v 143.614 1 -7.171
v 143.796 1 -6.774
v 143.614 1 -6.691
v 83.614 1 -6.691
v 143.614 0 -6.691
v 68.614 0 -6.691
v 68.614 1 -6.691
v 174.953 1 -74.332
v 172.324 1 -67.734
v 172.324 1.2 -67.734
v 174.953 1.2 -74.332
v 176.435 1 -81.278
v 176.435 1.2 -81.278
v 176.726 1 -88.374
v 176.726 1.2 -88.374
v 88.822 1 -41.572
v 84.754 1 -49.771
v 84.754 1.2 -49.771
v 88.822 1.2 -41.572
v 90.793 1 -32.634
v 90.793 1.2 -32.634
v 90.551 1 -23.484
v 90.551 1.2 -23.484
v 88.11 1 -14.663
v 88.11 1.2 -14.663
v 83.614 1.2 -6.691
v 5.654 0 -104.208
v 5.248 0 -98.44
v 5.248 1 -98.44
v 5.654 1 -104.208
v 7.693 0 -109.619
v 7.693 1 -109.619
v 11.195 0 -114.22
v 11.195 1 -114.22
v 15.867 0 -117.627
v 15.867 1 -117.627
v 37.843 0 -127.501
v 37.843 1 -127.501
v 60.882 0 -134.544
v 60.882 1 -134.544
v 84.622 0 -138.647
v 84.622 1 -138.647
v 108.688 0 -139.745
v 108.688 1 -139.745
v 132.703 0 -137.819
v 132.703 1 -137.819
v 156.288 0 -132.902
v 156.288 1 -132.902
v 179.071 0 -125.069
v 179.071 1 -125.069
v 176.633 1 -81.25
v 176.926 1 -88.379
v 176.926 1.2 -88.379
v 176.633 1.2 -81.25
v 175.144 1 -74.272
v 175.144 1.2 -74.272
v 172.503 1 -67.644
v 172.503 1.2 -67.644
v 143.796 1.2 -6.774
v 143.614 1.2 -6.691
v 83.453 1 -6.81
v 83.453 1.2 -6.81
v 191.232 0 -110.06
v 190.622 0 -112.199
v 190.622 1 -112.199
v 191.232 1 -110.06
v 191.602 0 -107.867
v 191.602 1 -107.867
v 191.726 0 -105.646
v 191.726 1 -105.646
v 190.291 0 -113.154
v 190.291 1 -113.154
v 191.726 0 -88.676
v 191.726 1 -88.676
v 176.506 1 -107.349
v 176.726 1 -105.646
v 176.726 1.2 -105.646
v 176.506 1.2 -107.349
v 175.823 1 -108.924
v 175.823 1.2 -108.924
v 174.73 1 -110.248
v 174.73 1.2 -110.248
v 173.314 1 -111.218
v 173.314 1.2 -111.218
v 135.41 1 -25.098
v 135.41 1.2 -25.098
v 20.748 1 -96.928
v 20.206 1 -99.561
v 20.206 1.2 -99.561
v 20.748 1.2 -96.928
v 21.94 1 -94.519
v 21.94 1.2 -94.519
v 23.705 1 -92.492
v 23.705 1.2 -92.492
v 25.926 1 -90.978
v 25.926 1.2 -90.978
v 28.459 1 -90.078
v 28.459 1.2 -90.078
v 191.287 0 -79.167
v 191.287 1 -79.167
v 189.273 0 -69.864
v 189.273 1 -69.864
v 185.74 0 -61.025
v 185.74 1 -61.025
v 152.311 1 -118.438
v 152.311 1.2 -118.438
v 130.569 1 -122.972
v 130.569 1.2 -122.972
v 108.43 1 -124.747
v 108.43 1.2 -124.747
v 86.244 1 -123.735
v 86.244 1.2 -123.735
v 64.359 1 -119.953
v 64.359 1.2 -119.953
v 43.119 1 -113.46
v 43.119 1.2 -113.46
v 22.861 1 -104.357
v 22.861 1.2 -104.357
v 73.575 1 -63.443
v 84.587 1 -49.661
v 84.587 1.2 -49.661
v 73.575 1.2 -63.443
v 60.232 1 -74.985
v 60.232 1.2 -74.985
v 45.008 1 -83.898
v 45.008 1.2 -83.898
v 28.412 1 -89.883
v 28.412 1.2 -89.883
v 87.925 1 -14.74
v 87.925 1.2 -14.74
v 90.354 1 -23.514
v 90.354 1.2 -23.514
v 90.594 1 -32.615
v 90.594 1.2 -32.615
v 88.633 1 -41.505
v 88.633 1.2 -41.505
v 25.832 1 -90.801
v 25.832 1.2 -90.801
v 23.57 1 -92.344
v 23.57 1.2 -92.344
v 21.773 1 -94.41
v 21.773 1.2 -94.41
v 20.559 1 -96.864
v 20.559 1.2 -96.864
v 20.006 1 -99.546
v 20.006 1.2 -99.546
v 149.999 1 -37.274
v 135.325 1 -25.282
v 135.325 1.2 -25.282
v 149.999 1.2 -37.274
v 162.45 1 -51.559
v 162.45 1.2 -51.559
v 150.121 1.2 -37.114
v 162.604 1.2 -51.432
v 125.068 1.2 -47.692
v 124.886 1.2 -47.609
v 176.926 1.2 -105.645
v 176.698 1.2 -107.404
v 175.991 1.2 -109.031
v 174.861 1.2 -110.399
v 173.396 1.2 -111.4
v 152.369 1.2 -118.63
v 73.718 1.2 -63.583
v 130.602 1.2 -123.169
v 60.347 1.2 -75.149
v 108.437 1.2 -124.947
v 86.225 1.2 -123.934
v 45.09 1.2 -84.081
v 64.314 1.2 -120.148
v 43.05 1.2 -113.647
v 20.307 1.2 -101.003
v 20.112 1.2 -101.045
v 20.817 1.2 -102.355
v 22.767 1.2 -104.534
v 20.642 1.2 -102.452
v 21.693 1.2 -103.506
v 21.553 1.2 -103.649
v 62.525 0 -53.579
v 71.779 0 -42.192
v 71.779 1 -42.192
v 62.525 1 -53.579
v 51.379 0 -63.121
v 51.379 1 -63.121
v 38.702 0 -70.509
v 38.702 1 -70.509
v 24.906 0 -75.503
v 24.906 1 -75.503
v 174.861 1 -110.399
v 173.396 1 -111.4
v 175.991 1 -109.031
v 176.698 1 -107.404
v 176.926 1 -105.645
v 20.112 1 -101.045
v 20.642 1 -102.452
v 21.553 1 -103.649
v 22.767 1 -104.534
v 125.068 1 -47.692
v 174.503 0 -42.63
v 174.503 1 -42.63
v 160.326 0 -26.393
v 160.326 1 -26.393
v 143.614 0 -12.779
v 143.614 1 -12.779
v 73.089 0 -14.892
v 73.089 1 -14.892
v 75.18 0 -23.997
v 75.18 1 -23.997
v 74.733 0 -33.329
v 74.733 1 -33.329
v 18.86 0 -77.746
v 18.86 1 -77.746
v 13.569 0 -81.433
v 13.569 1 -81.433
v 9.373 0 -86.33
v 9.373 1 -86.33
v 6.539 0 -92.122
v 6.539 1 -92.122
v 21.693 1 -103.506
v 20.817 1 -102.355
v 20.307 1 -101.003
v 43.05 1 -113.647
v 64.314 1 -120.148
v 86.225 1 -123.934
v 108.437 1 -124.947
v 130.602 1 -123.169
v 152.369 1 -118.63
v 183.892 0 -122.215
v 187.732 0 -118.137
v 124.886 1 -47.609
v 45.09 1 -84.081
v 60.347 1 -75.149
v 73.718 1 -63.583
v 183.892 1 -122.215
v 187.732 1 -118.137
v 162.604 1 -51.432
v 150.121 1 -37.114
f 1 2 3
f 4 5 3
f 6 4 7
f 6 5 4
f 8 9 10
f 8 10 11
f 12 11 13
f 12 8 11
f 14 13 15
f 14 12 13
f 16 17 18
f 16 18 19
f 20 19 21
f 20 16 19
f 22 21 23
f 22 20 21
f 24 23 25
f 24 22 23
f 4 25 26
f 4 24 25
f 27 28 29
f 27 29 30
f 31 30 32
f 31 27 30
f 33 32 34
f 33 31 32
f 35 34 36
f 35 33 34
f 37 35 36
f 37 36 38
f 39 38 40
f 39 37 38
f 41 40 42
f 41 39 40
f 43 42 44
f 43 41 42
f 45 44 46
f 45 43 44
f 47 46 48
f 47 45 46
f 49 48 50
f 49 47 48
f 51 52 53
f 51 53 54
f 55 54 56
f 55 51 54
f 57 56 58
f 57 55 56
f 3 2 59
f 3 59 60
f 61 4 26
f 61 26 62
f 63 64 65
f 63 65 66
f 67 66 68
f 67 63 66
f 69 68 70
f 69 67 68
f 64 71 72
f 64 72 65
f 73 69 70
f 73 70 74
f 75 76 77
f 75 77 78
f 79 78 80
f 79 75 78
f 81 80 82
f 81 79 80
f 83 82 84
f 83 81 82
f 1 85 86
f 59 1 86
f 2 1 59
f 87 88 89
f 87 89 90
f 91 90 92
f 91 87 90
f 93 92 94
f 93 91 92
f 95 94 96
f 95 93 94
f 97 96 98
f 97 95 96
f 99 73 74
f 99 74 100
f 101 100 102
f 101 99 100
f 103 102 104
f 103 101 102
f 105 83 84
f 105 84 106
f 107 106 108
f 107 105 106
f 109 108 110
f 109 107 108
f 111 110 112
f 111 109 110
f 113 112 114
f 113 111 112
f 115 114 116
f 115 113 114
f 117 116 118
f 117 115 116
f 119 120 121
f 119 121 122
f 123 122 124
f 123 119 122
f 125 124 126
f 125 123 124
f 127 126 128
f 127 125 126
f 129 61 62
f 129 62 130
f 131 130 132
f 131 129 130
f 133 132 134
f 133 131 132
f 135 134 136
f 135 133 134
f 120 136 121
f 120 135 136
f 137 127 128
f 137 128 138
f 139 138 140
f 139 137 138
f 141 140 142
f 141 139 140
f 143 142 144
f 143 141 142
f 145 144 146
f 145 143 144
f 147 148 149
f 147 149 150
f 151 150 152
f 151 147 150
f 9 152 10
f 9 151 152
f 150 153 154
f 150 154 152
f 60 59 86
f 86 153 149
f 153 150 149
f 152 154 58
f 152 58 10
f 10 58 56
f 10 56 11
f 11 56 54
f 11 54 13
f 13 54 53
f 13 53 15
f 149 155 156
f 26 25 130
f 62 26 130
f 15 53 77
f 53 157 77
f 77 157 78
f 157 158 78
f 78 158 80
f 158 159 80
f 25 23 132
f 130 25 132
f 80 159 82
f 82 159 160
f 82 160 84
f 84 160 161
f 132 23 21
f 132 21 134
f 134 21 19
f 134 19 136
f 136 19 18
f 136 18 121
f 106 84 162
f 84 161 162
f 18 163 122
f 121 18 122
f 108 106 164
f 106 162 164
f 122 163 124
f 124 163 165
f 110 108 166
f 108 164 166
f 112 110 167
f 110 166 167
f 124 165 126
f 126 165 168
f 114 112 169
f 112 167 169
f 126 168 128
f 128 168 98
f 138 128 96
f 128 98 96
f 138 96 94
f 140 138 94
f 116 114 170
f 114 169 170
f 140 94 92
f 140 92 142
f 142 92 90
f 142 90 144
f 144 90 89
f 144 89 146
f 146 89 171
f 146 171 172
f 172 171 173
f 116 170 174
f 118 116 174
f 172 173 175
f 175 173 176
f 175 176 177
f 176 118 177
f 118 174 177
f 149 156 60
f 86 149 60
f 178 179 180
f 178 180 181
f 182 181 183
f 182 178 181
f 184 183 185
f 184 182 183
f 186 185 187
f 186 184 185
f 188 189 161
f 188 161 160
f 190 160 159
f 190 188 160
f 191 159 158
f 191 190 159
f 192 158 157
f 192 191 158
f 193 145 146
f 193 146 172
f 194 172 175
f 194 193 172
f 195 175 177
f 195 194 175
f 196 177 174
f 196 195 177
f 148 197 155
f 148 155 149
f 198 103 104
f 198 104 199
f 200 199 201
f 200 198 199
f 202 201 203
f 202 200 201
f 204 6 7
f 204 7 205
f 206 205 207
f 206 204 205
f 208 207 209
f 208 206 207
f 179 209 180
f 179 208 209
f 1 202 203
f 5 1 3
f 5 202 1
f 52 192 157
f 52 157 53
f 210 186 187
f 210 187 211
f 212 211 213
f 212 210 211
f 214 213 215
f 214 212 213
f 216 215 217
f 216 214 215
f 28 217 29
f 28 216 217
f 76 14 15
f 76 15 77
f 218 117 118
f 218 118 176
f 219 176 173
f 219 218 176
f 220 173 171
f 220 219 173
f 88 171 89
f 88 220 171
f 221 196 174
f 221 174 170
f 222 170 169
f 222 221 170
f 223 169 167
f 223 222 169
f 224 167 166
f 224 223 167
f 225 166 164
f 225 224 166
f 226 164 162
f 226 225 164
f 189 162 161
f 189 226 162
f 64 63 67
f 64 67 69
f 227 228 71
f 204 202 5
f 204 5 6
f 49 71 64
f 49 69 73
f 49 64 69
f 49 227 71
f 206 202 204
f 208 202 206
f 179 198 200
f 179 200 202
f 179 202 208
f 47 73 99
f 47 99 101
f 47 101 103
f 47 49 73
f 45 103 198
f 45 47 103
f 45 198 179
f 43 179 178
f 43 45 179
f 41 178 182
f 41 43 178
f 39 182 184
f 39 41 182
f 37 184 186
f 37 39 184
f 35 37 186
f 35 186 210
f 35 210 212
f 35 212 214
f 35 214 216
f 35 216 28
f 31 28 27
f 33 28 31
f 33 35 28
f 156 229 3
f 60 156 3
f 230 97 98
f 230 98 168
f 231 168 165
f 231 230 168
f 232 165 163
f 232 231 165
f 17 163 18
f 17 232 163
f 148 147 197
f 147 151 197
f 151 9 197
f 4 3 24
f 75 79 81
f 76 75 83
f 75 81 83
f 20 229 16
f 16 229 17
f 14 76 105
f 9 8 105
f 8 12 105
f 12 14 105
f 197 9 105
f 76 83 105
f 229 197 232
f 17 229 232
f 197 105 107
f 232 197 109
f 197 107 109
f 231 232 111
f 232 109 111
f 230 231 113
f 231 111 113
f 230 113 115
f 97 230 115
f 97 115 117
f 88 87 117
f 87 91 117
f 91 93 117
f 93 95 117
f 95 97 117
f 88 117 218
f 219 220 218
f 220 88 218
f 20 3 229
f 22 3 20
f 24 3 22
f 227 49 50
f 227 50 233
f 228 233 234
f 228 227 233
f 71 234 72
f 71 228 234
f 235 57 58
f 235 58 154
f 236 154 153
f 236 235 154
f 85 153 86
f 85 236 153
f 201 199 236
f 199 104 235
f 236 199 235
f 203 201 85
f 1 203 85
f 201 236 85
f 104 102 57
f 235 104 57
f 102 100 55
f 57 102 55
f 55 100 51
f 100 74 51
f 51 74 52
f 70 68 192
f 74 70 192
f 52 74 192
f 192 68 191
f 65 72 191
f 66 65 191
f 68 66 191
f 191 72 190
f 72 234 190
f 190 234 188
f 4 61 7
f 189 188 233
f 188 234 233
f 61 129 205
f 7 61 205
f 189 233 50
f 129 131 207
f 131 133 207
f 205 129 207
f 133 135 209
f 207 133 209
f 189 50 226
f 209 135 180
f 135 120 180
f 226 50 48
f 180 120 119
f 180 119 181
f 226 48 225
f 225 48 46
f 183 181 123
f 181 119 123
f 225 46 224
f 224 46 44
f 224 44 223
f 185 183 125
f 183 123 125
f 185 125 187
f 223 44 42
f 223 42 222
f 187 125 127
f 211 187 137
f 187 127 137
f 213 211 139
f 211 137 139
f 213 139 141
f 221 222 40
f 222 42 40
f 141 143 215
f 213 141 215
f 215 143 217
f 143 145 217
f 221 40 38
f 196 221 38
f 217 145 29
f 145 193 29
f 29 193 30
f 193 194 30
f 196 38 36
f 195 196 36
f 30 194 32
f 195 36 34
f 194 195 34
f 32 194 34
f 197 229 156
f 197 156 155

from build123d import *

# Parameters (mm, degrees)
BOSS_EXTRUDE1_DEPTH = 1
EXTRUDE_THIN1_START = 1
EXTRUDE_THIN1_DEPTH = 0.2


with BuildPart() as part:
    # Sketch3 → Boss-Extrude1 (new body)
    with BuildSketch(Plane(origin=(0, 0, 0), x_dir=(1, 0, 0), z_dir=(0, 1, 0))):
        with BuildLine():
            Line((143.614236161, 12.778644367), (143.614236161, 6.690833444))
            Line((143.614236161, 6.690833444), (83.614236161, 6.690833444))
            Line((83.614236161, 6.690833444), (68.614236161, 6.690833444))
            ThreePointArc((68.614236161, 6.690833444), (75.180479735, 23.997298156), (71.779240838, 42.192375773))
            ThreePointArc((71.779240838, 42.192375773), (51.379079295, 63.12072091), (24.905577059, 75.502800726))
            ThreePointArc((24.905577059, 75.502800726), (11.315687886, 83.748123559), (5.247844857, 98.440016471))
            ThreePointArc((5.247844857, 98.440016471), (7.693142423, 109.618807389), (15.866887418, 117.62722417))
            ThreePointArc((15.866887418, 117.62722417), (96.637810578, 139.573762678), (179.070811064, 125.068832083))
            ThreePointArc((179.070811064, 125.068832083), (185.95529686, 120.311391566), (190.290589438, 113.153555076))
            Line((190.290589438, 113.153555076), (190.62158299, 112.199107439))
            ThreePointArc((190.62158299, 112.199107439), (191.44765289, 108.968802746), (191.725584387, 105.646151098))
            Line((191.725584387, 105.646151098), (191.725584387, 88.676044486))
            ThreePointArc((191.725584387, 88.676044486), (190.474138078, 74.473395816), (185.740302271, 61.024524277))
            ThreePointArc((185.740302271, 61.024524277), (167.758196388, 34.211461518), (143.614236161, 12.778644367))
        make_face()
    extrude(amount=BOSS_EXTRUDE1_DEPTH)

    # Sketch6 → Extrude-Thin1 (add)
    with BuildSketch(Plane(origin=(0, 0, 0), x_dir=(1, 0, 0), z_dir=(0, 1, 0)).offset(EXTRUDE_THIN1_START)):
        with BuildLine():
            ThreePointArc((135.157565874, 25.167539704), (156.459213519, 44.077209645), (172.324402154, 67.73374361))
            ThreePointArc((172.324402154, 67.73374361), (175.840861474, 77.773394532), (176.725584387, 88.374212526))
            Line((176.725584387, 88.374212526), (176.725584387, 105.646151098))
            ThreePointArc((176.725584387, 105.646151098), (175.822683582, 108.923695738), (173.313645893, 111.217657072))
            ThreePointArc((173.313645893, 111.217657072), (97.321055557, 124.589331548), (22.860686061, 104.357454747))
            ThreePointArc((22.860686061, 104.357454747), (20.817249813, 102.355350552), (20.205925421, 99.560652822))
            ThreePointArc((20.205925421, 99.560652822), (22.75737939, 93.448802044), (28.458504402, 90.078073505))
            ThreePointArc((28.458504402, 90.078073505), (60.346877221, 75.148921347), (84.753788625, 49.770769703))
            ThreePointArc((84.753788625, 49.770769703), (90.951279239, 28.051793518), (83.614236161, 6.690833444))
            Line((83.614236161, 6.690833444), (83.45325287, 6.809511075))
            ThreePointArc((83.45325287, 6.809511075), (90.751349173, 28.057082078), (84.586756318, 49.660768756))
            ThreePointArc((84.586756318, 49.660768756), (60.232106569, 74.985116949), (28.412138365, 89.883479249))
            ThreePointArc((28.412138365, 89.883479249), (22.605157011, 93.319061801), (20.006484347, 99.545711004))
            ThreePointArc((20.006484347, 99.545711004), (20.642261714, 102.452196643), (22.767435413, 104.534385006))
            ThreePointArc((22.767435413, 104.534385006), (97.315220897, 124.789273275), (173.396463183, 111.39982251))
            ThreePointArc((173.396463183, 111.39982251), (175.99119074, 109.031493114), (176.925584387, 105.644975177))
            Line((176.925584387, 105.644975177), (176.925584387, 88.378563485))
            ThreePointArc((176.925584387, 88.378563485), (176.036009323, 77.729553344), (172.503280822, 67.644287353))
            ThreePointArc((172.503280822, 67.644287353), (156.609866623, 43.945666337), (135.270321477, 25.002354432))
            Line((135.270321477, 25.002354432), (135.157565874, 25.167539704))
        make_face()
        Polygon((143.614236161, 6.690833444), (124.886408885, 47.608659456), (125.068265889, 47.691894244), (143.796093165, 6.774068232), align=None)
    extrude(amount=EXTRUDE_THIN1_DEPTH)


solid = part.part
